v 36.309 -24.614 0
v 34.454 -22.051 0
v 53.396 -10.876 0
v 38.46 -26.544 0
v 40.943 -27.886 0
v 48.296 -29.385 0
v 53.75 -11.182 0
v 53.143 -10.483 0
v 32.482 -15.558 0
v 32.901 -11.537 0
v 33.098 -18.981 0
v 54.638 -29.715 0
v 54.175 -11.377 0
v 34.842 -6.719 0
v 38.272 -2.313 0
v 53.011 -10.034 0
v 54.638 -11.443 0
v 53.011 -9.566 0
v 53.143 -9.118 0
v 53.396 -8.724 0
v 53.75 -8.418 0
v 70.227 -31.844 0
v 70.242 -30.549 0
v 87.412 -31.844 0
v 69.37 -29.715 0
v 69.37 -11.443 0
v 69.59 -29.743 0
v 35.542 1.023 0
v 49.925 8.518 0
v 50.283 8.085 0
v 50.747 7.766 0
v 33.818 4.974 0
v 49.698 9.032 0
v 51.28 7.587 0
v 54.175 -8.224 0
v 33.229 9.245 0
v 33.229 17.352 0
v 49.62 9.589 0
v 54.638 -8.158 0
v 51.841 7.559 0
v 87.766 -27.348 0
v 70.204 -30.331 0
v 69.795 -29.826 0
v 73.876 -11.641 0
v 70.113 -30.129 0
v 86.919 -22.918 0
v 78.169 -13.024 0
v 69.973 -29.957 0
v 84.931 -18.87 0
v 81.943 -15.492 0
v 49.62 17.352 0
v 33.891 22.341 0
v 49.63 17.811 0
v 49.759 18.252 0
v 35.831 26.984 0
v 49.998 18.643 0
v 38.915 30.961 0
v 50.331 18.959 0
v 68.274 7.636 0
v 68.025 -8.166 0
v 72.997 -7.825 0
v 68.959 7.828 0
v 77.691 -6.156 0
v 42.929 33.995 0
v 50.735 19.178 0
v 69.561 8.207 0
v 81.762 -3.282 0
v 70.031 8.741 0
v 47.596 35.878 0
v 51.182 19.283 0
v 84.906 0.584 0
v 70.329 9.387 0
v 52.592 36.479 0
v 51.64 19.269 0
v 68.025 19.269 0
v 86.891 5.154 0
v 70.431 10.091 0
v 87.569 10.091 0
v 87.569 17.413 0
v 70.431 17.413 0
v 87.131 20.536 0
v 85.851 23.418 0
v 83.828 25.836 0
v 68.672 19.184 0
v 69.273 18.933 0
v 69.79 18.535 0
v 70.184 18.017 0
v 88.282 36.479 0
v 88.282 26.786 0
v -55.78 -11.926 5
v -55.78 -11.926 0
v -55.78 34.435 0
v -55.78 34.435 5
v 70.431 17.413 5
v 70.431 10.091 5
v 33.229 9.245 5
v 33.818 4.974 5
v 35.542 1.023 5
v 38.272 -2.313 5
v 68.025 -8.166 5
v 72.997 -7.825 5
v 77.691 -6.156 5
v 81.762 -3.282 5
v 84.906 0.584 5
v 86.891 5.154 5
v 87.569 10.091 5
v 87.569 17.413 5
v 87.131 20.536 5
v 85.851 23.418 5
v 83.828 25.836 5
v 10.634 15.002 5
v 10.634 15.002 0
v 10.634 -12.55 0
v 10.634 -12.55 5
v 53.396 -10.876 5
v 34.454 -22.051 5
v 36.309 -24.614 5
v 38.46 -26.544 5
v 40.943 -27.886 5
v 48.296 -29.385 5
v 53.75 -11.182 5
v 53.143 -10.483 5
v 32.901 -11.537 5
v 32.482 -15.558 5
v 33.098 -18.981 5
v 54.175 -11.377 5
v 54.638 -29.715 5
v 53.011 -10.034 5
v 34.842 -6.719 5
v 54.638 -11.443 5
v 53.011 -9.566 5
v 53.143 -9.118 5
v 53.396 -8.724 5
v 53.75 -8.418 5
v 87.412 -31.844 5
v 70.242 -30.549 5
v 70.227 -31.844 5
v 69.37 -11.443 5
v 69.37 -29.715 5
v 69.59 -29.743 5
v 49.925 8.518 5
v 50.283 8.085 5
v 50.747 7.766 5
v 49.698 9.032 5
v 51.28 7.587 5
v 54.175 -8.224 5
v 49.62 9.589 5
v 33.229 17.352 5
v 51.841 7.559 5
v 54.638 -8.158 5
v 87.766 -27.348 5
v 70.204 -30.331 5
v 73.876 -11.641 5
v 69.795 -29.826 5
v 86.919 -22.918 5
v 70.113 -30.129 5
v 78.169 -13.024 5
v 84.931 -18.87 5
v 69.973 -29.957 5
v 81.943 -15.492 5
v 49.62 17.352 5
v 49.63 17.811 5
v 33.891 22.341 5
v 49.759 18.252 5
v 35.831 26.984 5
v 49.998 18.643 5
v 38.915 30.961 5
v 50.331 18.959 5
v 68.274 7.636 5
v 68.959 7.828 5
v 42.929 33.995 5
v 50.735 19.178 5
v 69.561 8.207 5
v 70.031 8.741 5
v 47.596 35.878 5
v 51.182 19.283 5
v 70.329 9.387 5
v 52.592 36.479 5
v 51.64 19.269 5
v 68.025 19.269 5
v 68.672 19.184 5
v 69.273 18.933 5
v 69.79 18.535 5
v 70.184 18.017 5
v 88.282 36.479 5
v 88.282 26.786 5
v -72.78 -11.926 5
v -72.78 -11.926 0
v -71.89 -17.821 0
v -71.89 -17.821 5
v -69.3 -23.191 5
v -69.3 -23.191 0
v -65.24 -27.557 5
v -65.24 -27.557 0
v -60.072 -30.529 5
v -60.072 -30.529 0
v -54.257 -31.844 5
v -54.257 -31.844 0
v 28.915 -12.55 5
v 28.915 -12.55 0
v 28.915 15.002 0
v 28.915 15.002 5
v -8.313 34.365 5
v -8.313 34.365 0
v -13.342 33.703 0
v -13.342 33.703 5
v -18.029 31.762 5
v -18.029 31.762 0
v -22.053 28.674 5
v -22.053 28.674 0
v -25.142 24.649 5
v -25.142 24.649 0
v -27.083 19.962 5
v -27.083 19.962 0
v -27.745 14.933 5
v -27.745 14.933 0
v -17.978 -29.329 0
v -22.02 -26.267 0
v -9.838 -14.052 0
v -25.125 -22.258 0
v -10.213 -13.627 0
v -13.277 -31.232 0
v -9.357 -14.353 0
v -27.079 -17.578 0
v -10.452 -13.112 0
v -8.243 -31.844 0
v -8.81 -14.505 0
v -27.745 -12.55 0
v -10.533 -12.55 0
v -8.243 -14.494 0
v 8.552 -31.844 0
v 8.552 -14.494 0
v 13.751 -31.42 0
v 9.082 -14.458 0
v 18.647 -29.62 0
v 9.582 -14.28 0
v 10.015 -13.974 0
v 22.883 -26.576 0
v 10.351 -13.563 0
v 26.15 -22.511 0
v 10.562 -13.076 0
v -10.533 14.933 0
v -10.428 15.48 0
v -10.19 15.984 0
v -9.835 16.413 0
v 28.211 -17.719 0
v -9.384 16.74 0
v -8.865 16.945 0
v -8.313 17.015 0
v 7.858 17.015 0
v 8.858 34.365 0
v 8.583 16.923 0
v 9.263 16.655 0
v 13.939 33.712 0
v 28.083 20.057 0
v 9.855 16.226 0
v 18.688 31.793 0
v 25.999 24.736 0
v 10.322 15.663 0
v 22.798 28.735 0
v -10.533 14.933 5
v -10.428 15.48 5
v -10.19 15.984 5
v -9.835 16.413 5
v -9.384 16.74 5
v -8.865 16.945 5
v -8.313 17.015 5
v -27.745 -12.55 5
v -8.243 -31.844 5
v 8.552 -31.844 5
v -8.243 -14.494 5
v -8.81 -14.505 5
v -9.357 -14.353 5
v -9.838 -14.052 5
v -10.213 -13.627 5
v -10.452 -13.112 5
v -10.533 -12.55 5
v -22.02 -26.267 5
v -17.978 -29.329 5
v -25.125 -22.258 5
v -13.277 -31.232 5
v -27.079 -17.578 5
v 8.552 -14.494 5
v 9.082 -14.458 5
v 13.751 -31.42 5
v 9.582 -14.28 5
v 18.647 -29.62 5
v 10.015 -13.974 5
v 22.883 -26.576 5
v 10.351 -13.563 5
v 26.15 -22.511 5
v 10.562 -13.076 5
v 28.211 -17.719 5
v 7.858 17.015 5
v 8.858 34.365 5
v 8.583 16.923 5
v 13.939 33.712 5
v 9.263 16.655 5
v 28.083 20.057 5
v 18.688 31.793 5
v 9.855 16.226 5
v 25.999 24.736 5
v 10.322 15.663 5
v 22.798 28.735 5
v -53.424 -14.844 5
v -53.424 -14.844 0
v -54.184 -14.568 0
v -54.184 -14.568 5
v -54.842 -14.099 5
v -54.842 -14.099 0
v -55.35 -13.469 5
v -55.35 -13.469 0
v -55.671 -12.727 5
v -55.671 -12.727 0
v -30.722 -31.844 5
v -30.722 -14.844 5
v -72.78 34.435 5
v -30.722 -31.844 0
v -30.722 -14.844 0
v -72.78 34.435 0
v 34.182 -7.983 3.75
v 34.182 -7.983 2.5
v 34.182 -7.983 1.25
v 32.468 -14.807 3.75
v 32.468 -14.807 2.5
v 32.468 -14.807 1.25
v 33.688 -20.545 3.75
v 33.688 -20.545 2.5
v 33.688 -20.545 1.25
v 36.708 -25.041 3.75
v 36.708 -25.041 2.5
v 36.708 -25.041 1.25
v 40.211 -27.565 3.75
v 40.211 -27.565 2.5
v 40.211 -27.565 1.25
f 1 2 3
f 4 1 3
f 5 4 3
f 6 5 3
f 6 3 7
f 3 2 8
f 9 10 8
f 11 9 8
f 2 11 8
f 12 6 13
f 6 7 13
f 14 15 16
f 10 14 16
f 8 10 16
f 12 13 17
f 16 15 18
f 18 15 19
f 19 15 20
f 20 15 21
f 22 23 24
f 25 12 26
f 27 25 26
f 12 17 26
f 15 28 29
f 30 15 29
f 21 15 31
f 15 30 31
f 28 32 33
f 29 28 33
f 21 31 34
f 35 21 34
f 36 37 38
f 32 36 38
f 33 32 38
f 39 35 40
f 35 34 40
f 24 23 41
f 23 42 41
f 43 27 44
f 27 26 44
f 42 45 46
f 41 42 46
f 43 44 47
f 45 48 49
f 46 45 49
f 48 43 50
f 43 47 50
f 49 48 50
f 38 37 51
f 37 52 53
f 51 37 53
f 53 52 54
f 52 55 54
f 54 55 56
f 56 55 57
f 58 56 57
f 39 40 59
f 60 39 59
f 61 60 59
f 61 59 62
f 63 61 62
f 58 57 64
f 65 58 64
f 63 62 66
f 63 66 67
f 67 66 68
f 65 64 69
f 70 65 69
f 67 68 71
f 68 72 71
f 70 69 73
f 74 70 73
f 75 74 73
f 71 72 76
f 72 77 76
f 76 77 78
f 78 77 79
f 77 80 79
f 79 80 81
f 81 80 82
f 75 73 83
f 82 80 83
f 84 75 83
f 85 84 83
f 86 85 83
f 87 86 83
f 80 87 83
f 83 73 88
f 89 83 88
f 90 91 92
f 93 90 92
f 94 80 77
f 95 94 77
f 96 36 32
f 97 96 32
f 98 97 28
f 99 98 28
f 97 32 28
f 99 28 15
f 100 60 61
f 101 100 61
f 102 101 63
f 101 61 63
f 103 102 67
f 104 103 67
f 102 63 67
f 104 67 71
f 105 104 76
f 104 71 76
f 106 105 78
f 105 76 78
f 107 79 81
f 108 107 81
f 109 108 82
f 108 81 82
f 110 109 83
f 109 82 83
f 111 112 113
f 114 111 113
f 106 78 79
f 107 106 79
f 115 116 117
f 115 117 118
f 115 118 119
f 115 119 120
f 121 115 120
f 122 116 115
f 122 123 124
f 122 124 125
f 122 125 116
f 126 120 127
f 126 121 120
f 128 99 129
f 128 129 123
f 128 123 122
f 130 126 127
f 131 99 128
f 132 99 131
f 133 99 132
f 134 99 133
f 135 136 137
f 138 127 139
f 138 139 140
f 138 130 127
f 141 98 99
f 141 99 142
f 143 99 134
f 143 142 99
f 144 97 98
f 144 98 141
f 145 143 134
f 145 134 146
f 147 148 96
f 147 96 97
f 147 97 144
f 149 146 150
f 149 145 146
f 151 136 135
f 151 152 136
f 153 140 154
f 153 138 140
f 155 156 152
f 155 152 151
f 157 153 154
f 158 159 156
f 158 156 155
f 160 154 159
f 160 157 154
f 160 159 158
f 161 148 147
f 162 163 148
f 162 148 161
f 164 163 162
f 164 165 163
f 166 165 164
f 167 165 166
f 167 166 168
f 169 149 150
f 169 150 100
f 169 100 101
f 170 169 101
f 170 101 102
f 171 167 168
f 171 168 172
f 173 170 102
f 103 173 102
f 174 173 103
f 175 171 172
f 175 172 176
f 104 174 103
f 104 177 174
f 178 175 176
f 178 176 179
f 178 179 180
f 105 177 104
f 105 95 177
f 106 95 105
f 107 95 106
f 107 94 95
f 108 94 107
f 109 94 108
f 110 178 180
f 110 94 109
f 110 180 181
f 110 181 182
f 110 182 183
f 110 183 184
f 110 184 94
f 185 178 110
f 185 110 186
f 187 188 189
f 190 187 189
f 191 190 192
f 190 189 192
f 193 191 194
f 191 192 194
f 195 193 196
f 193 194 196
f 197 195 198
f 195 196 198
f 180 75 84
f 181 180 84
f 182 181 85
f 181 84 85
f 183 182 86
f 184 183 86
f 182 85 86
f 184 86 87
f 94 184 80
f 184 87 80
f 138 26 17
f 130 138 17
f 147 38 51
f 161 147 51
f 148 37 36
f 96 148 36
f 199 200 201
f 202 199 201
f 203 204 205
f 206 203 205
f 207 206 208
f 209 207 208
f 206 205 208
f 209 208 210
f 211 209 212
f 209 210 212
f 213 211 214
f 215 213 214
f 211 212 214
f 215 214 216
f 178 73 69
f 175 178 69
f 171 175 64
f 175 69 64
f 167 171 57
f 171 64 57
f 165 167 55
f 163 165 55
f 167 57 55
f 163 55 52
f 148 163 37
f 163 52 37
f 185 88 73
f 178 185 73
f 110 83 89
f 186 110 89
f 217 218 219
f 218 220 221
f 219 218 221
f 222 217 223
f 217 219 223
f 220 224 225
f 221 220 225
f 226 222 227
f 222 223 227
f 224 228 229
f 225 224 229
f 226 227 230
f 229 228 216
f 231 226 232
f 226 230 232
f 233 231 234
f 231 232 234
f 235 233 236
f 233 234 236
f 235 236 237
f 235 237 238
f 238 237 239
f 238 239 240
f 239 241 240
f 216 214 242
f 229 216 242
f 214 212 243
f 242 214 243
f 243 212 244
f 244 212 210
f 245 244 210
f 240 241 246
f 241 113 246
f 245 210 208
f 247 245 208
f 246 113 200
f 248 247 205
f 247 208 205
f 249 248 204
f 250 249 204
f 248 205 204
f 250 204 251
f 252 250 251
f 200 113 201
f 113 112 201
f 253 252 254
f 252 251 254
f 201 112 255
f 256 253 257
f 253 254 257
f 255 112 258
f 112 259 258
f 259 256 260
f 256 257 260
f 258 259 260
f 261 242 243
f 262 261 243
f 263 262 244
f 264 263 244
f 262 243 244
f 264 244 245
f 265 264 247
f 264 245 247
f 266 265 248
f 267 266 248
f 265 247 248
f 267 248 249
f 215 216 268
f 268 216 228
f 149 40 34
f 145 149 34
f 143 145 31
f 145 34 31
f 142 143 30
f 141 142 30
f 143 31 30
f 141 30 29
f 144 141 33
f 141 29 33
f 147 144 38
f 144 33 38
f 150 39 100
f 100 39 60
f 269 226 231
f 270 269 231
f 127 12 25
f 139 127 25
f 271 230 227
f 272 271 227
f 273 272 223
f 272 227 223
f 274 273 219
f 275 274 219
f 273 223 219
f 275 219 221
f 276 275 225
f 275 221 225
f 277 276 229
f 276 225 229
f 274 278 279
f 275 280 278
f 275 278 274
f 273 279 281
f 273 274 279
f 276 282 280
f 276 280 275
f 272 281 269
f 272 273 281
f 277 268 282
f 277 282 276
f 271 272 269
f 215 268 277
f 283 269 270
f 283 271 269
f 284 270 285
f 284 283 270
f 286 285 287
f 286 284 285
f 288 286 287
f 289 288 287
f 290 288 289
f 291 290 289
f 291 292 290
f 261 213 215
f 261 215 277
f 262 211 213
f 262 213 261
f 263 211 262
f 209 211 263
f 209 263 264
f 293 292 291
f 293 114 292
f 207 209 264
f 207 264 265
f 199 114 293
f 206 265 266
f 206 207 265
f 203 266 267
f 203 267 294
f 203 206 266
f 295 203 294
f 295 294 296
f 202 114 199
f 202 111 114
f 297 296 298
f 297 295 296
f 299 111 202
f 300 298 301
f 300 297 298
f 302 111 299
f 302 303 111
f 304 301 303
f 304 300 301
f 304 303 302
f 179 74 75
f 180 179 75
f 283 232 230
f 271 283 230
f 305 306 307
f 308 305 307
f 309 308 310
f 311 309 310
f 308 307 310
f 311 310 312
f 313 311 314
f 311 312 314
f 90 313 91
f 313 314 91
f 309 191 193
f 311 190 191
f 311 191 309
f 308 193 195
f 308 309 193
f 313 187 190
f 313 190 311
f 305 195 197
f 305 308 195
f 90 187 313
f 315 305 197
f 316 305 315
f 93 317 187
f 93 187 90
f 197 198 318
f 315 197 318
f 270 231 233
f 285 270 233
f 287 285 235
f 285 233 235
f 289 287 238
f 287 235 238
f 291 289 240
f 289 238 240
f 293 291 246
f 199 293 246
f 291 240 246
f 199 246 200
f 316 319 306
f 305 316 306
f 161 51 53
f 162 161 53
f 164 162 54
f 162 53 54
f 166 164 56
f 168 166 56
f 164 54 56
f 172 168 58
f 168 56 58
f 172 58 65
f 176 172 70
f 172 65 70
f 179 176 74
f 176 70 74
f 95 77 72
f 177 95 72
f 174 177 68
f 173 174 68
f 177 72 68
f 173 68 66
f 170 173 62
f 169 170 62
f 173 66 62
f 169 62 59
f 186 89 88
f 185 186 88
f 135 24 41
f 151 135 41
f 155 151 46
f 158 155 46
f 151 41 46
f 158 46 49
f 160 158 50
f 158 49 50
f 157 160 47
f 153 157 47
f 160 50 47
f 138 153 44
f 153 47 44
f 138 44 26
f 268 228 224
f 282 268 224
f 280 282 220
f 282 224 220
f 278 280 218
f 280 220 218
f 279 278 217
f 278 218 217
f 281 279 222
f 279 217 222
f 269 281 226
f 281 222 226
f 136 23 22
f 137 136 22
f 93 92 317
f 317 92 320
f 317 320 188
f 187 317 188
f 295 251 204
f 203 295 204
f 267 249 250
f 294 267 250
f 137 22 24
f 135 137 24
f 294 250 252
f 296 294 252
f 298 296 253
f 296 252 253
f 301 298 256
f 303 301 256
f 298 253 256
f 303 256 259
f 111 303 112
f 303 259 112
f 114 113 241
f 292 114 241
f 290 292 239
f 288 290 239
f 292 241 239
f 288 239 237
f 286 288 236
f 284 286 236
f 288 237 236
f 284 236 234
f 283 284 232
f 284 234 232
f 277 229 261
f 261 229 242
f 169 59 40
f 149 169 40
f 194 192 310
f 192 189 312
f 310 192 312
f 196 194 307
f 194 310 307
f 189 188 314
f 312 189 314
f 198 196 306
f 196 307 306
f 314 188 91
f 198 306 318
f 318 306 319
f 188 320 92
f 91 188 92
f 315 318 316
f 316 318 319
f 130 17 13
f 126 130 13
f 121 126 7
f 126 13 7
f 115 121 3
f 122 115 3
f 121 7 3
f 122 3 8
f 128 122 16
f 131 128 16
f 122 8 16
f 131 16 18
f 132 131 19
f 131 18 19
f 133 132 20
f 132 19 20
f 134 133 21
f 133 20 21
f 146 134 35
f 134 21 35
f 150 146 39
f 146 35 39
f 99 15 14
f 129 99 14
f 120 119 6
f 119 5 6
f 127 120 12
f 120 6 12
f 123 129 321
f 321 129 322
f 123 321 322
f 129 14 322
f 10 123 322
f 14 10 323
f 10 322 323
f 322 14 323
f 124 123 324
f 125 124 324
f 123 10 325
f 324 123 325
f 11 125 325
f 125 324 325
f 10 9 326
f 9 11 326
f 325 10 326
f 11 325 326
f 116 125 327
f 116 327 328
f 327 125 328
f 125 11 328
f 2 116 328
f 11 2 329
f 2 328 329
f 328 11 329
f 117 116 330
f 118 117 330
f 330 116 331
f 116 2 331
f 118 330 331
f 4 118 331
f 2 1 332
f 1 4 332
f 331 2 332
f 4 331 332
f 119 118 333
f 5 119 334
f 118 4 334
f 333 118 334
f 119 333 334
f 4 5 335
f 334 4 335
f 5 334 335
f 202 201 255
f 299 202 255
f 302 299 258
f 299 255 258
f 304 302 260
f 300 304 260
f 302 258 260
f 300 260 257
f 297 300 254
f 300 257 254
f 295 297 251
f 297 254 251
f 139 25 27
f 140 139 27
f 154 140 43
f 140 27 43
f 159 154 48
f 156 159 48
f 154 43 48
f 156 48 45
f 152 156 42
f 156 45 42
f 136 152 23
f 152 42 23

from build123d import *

# Parameters (mm, degrees)
F1_DEPTH = 5


with BuildPart() as f1:
    # F0 (on Top) → F1 (new body)
    with BuildSketch(Plane.XY):
        with BuildLine():
            Line((69.0254477669, 36.478952693), (52.5922080591, 36.478952693))
            ThreePointArc((52.5922080591, 36.478952693), (38.9148610046, 30.9606208127), (33.2290071434, 17.3520619228))
            Line((33.2290071434, 17.3520619228), (33.2290071434, 9.2449376035))
            ThreePointArc((33.2290071434, 9.2449376035), (34.5445928815, 2.939687304), (38.2718139765, -2.3133851381))
            add(Edge.make_bspline(
                [(38.2718139765, -2.3133851381), (35.0478488895, -5.3165623155), (30.2592020644, -14.7034185415), (36.0939314958, -25.985295981), (43.8425110573, -29.4666625115), (53.2125632474, -29.6906994828), (54.6381439599, -29.7151729536)],
                knots=[0, 0, 0, 0, 0.2816521908, 0.5342188674, 0.7608236544, 1, 1, 1, 1], degree=3))
            Line((54.6381439599, -29.7151729536), (69.3701195319, -29.7151729536))
            ThreePointArc((69.3701195319, -29.7151729536), (69.9733642707, -29.9570802107), (70.2423343717, -30.548754463))
            Line((70.2423343717, -30.548754463), (70.2272322525, -31.8442919593))
            Line((70.2272322525, -31.8442919593), (87.4116472257, -31.8442919593))
            ThreePointArc((87.4116472257, -31.8442919593), (83.5502679976, -17.0809901044), (69.3701195319, -11.4428414106))
            Line((69.3701195319, -11.4428414106), (54.6381439599, -11.4428414106))
            ThreePointArc((54.6381439599, -11.4428414106), (52.9944971814, -9.8002078968), (54.6381439599, -8.157574383))
            Line((54.6381439599, -8.157574383), (68.0254477647, -8.1658298467))
            ThreePointArc((68.0254477647, -8.1658298467), (81.7618760668, -3.2815502715), (87.5694662906, 10.0907174965))
            Line((87.5694662906, 10.0907174965), (87.5694662906, 17.4134502913))
            ThreePointArc((87.5694662906, 17.4134502913), (86.5919834102, 22.0215377909), (83.8278918088, 25.8359500398))
            Line((83.8278918088, 25.8359500398), (88.2823672034, 26.7858023203))
            Line((88.2823672034, 26.7858023203), (88.2823672034, 36.478952693))
            Line((88.2823672034, 36.478952693), (69.0254477669, 36.478952693))
        make_face()
        with BuildLine():
            ThreePointArc((49.6204711441, 17.3520619228), (50.1543003184, 18.8122592839), (51.6403470435, 19.2692221399))
            Line((51.6403470435, 19.2692221399), (68.0254477647, 19.2692221399))
            ThreePointArc((68.0254477647, 19.2692221399), (69.5445994795, 18.751368254), (70.4311490297, 17.4134502913))
            Line((70.4311490297, 17.4134502913), (70.4311490297, 10.0907174965))
            ThreePointArc((70.4311490297, 10.0907174965), (69.8152683538, 8.4569986346), (68.2741651015, 7.6364213425))
            Line((68.2741651015, 7.6364213425), (51.8411074036, 7.559078022))
            ThreePointArc((51.8411074036, 7.559078022), (50.2834373163, 8.0849521369), (49.6204711441, 9.5893973968))
            Line((49.6204711441, 9.5893973968), (49.6204711441, 17.3520619228))
        make_face(mode=Mode.SUBTRACT)
    extrude(amount=F1_DEPTH)


with BuildPart() as f1b:
    # F0 (on Top) → F1, piece 2 (new body)
    with BuildSketch(Plane.XY):
        with BuildLine():
            Line((8.8582125176, 34.3654769861), (-8.3125179988, 34.3654769861))
            ThreePointArc((-8.3125179988, 34.3654769861), (-22.0534674563, 28.6737891725), (-27.7451546266, 14.9328394486))
            Line((-27.7451546266, 14.9328394486), (-27.7451546266, -12.5504608341))
            ThreePointArc((-27.7451546266, -12.5504608341), (-22.0203793172, -26.2670700833), (-8.2431147925, -31.8442919593))
            Line((-8.2431147925, -31.8442919593), (8.5522345715, -31.8442919593))
            ThreePointArc((8.5522345715, -31.8442919593), (22.8829501137, -26.5764477151), (28.9154689034, -12.5504608341))
            Line((28.9154689034, -12.5504608341), (28.9154689034, 15.0022408353))
            ThreePointArc((28.9154689034, 15.0022408353), (22.797621113, 28.7348101355), (8.8582125176, 34.3654769861))
        make_face()
        with BuildLine():
            ThreePointArc((-10.533391484, 14.9328394486), (-9.8346291897, 16.4129933063), (-8.3125179988, 17.014908341))
            Line((-8.3125179988, 17.014908341), (7.858212517, 17.014908341))
            ThreePointArc((7.858212517, 17.014908341), (9.5726739072, 16.4588030878), (10.6343034638, 15.0022408353))
            Line((10.6343034638, 15.0022408353), (10.6343034638, -12.5504608341))
            ThreePointArc((10.6343034638, -12.5504608341), (10.0154939421, -13.9744765885), (8.5522345714, -14.4937242239))
            Line((8.5522345714, -14.4937242239), (-8.2431147927, -14.4937242239))
            ThreePointArc((-8.2431147927, -14.4937242239), (-9.8380944274, -14.0522630785), (-10.533391484, -12.5504608341))
            Line((-10.533391484, -12.5504608341), (-10.533391484, 14.9328394486))
        make_face(mode=Mode.SUBTRACT)
    extrude(amount=F1_DEPTH)


with BuildPart() as f1c:
    # F0 (on Top) → F1, piece 3 (new body)
    with BuildSketch(Plane.XY):
        with BuildLine():
            Line((-55.7802731142, 34.4349348745), (-72.7802731142, 34.4349348745))
            Line((-72.7802731142, 34.4349348745), (-72.7802731142, -11.925838347))
            ThreePointArc((-72.7802731142, -11.925838347), (-67.4337374671, -25.5260479515), (-54.2568282176, -31.8442919593))
            Line((-54.2568282176, -31.8442919593), (-30.7224924042, -31.8442919593))
            Line((-30.7224924042, -31.8442919593), (-30.7224924042, -14.8442919593))
            Line((-30.7224924042, -14.8442919593), (-53.4240006607, -14.8442919593))
            ThreePointArc((-53.4240006607, -14.8442919593), (-55.1176780429, -13.8012977149), (-55.7802731142, -11.925838347))
            Line((-55.7802731142, -11.925838347), (-55.7802731142, 34.4349348745))
        make_face()
    extrude(amount=F1_DEPTH)


solid = Compound([f1.part, f1b.part, f1c.part])
